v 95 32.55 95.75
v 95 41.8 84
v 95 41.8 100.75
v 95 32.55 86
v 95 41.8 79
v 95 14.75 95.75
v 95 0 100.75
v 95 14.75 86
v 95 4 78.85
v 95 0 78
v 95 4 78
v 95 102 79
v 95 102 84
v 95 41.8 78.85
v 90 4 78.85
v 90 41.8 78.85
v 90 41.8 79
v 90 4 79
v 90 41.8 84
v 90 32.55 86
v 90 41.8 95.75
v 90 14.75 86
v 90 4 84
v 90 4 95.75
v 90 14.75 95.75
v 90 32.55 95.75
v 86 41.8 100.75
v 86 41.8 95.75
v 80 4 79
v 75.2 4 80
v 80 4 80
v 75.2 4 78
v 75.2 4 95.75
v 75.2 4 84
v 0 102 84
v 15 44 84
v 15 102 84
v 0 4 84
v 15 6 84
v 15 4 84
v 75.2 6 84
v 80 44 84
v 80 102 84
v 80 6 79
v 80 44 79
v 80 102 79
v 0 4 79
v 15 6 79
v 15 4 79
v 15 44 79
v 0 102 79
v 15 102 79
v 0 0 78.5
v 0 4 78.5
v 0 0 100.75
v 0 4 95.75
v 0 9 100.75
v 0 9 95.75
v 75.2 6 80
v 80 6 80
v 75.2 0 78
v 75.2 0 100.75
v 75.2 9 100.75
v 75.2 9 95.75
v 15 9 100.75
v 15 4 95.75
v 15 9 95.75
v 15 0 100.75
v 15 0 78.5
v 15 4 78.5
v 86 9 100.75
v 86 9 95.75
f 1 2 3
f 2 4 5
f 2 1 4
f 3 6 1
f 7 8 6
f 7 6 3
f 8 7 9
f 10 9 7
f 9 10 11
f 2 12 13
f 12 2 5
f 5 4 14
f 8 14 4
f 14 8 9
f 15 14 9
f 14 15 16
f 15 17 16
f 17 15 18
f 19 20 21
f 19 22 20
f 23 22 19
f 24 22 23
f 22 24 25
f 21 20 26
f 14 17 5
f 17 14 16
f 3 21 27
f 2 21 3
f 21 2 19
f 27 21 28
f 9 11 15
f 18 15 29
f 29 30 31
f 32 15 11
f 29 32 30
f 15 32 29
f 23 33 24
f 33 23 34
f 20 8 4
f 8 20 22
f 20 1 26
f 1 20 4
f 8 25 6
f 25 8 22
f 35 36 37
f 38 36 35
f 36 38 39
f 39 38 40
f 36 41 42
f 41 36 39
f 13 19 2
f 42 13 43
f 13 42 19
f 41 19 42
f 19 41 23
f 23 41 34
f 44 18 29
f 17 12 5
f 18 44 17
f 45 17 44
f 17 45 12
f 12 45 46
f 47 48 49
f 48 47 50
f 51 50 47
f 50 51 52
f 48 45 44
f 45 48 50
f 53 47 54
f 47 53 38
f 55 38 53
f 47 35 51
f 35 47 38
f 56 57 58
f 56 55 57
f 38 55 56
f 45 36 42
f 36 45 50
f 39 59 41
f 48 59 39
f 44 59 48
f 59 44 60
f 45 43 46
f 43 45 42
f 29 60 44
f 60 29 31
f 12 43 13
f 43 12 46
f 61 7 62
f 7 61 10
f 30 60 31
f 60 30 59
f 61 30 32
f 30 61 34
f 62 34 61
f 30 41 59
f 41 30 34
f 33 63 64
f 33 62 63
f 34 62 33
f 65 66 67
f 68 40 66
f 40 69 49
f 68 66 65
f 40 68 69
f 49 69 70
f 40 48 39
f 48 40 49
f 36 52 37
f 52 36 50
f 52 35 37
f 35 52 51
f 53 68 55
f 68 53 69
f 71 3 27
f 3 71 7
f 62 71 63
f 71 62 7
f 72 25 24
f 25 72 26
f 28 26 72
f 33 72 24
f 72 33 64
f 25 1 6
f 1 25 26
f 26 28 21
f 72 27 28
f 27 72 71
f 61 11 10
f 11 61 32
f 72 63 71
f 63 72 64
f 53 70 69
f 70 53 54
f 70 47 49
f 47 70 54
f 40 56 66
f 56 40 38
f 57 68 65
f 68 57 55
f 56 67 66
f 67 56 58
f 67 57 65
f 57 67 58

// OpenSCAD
// file: ../robot_settings.scad
main_box_x = 95; // 96
main_box_y = 102;
main_box_z = 74; // 74.5
wall_thickness = 2;

rail_gap = 2;
rail_inset = 7;

rail_thickness = 7;
rail_length = 250;
rail_width = 200;

raspberry_pi_screw_seperation_y = 57;
raspberry_pi_screw_seperation_z = 48;
raspberry_pi_peg_h = 5;

battery_box_peg_h = 6;
battery_box_peg_d = 8;
battery_box_peg_cutout = 5;

gears_module = 1;
pinion_gear_teeth = 30;
pinion_gear_width = 5;
pinion_gear_bore = 4;

gears_setback_distance = 25;
gear_post_height = 2 * pinion_gear_width + rail_thickness + 8 ;

steering_motor_mount_x = 45;
steering_motor_mount_y = 36;
steering_motor_mount_z = 18;
steering_motor_mount_setback_distance = gears_setback_distance + 16;

dc_motor_drivertype = "Teyleten"; // Teyleten
isAdafruit = (dc_motor_drivertype == "Adafruit");

drv8871_x = isAdafruit ? 20.3 : 21.6;
drv8871_y = isAdafruit ?  24 : 25;

drv8871_z = 2;
drv8871_screw_d = 2.5;
drv8871_solder_points_z = 2;

drv8871mount_edge_x = 1.5;
drv8871mount_edge_wall = 3;
drv8871mount_z = 5;
drv8871mount_x = drv8871_x +  drv8871mount_edge_wall - 2* drv8871mount_edge_x;
drv8871mount_y = 19;

drv8871_screw_distance = 15.64;
drv8871_solder_points_d = 1.66;
drv8871_solder_offset_y = 4.4;
drv8871_solder_inner_points_distance = 5;
drv8871_solder_outer_points_distance = 12;

dc_motor_housing_minus_encoder_z = 48;
dc_motor_encoder_z = 9.33;
dc_motor_encoder_wheel_d = 13.4;
dc_motor_encoder_wheel_thickness = 5;
dc_motor_encoder_wheel_gap = 3;
dc_motor_encoder_circuit_thickness = 2;
dc_motor_cutout_d = 24.8;
dc_motor_cutout_z = 19.5;

dc_motor_screw_head_z = 2;
dc_motor_screw_head_d = 5.6;
dc_motor_screw_d = 3.2;
dc_motor_screw_offset = 8.5;

dc_motor_axle_ring_z = 3;
dc_motor_axle_ring_d = 7.2;
dc_motor_axle_cutout_d = 4.5;
dc_motor_axle_cutout_z = 10;
dc_motor_axle_notch_cutout = 0.4;
dc_motor_axle_notch_cutout_z = 6;

pdmount_x = 20;
pdmount_y = 30;
pdmount_z = 2;
pdmount_edge_x = 1.5;
pdmount_edge_wall = 3;

steering_shaft_z = 45;
steering_shaft_d = 7;
steering_shaft_motor_fitting_d = 9;
coupler_length = 24.6;
coupler_diameter = 14;
coupler_screw_d = 4;
coupler_screw_z_offset = 5;
coupler_gear_side_insert = 12.6;
steering_shaft_with_coupler_z = steering_shaft_z - coupler_gear_side_insert;

lidar_mount_y = 110;
lidar_mount_x = 65 + 20;
lidar_narrow_screws = 40;
lidar_wide_screws = 56;
lidar_front_to_back_screws = 70;
lidar_screw_d = 3;
lidar_circuitboard_x = 20;
lidar_circuitboard_y = 35;
lidar_circuitboard_z = 1.2;
lidar_cord_length = 29;

ball_bearing_height = 7;
ball_bearing_outer_diameter = 22;
ball_bearing_inner_diameter = 8;

 armature_holder_height = 20;
 armature_holder_thickness = 8;
pull_bar_peg_r = 3.2;
apparatus_locking_peg_d = 4;

rack_module = 1;
rack_length = main_box_x / 2;
rack_height = 10;
rack_width = 10;
rack_teeth = 30;
rack_bore = 3;

pull_bar_length = rail_width / 2 - rack_length + 1;

// tire hardware
axle_length = 30;
axle_reciever_inner_diameter = 7.75;
axle_reciever_length = 18.8;
axle_notch_length = 7;
axle_notch_cutout = 2.4;

// power distribution bar
power_bar_cutout_x = 96;
power_bar_y = 19.1;
power_bar_z = 1.5;
power_bar_screw_distance = 91.4;
power_bar_screw_d = 2.8;
power_bar_standoff_z = 5;
power_bar_standoff_d = 6.83;

// breadboard
breadboard_wall_thickness = 3;
breadboard_width = 55;
breadboard_length = 83;
breadboard_height = 10.5;
breadboard_notch_width = 4.2;
breadboard_longside_notch_separation = 58.2 - breadboard_notch_width / 2;
breadboard_shortside_notch_separation = 26.3 - breadboard_notch_width;

pico_expander_width = 63;
pico_expander_height = 57;
pico_screw_hole_offset = 3;
pico_screw_hole_d = 2.5;

usbhub_thickness = 11.7;
usbhub_depth = 37.5;
usbhub_width = 86.7;
usbhub_end_port_width = 14.8;
usbhub_end_port_height = 12;
usbhub_front_face_safe_zone_left = 15;
usbhub_front_face_safe_zone_right = 14.8;

switch_w = 16;
switch_cutout_d = 12.2;
switch_bump_h = 2;
switch_bump_l = 18.2;
// main file
include <../robot_settings.scad>

module targus4mount()
{
   spacer = 5;
  
  // spacers to allow for better usb fit
  // main spacer
  translate([0, 6, main_box_z + spacer])
  cube([main_box_x,  38, spacer]);
  
  // right side spacer
  translate([main_box_x -15, 0, main_box_z + spacer])
  cube([15, main_box_y, spacer]);
  
  // small right side wall filler
  translate([main_box_x -19.8, 4, main_box_z + spacer + 1])
  cube([4.8, 2, spacer - 1]);
  
  // left side spacer
  translate([0, 0, main_box_z + spacer])
  cube([15, main_box_y, spacer]);
  
  // holders for Targus 4 port
  difference() {
    // end wall
    translate([main_box_x - 5, 4, main_box_z + usbhub_thickness / 2 - 1 ])
    cube([5, usbhub_depth + .3, usbhub_thickness + usbhub_thickness / 2 + spacer - 1]);
    
    // usb cutout
     color("green")
    translate([main_box_x - 6, usbhub_depth / 2 -4 , main_box_z + usbhub_end_port_height])
    cube([7, usbhub_end_port_width + 3, usbhub_end_port_height]);
  }

  // end roof
  translate([main_box_x - 9, 4.3, main_box_z + usbhub_thickness + usbhub_thickness / 2 + spacer - .8])
  cube([9, usbhub_depth, 5]);
  
  // side right wall
  translate([main_box_x - usbhub_front_face_safe_zone_right - 5, 0, main_box_z + 4])
  cube([usbhub_front_face_safe_zone_right + 5, 4, usbhub_thickness  + usbhub_thickness / 2 + spacer]);
  
  // side right roof
   translate([main_box_x - usbhub_front_face_safe_zone_right - 5, 0, main_box_z + usbhub_thickness + usbhub_thickness / 2 + spacer - .8])
   cube([usbhub_front_face_safe_zone_right + 5, 9, 5]);
 
  // side left wall
  translate([0, 0, main_box_z + 4.5])
  cube([usbhub_front_face_safe_zone_left , 4, usbhub_thickness  + usbhub_thickness / 2 + spacer - .8]);
  
  // side left roof
  translate([0, 0, main_box_z + usbhub_thickness + usbhub_thickness / 2  + spacer - .8])
   cube([usbhub_front_face_safe_zone_left, 9, 5]);
 
}
targus4mount();
